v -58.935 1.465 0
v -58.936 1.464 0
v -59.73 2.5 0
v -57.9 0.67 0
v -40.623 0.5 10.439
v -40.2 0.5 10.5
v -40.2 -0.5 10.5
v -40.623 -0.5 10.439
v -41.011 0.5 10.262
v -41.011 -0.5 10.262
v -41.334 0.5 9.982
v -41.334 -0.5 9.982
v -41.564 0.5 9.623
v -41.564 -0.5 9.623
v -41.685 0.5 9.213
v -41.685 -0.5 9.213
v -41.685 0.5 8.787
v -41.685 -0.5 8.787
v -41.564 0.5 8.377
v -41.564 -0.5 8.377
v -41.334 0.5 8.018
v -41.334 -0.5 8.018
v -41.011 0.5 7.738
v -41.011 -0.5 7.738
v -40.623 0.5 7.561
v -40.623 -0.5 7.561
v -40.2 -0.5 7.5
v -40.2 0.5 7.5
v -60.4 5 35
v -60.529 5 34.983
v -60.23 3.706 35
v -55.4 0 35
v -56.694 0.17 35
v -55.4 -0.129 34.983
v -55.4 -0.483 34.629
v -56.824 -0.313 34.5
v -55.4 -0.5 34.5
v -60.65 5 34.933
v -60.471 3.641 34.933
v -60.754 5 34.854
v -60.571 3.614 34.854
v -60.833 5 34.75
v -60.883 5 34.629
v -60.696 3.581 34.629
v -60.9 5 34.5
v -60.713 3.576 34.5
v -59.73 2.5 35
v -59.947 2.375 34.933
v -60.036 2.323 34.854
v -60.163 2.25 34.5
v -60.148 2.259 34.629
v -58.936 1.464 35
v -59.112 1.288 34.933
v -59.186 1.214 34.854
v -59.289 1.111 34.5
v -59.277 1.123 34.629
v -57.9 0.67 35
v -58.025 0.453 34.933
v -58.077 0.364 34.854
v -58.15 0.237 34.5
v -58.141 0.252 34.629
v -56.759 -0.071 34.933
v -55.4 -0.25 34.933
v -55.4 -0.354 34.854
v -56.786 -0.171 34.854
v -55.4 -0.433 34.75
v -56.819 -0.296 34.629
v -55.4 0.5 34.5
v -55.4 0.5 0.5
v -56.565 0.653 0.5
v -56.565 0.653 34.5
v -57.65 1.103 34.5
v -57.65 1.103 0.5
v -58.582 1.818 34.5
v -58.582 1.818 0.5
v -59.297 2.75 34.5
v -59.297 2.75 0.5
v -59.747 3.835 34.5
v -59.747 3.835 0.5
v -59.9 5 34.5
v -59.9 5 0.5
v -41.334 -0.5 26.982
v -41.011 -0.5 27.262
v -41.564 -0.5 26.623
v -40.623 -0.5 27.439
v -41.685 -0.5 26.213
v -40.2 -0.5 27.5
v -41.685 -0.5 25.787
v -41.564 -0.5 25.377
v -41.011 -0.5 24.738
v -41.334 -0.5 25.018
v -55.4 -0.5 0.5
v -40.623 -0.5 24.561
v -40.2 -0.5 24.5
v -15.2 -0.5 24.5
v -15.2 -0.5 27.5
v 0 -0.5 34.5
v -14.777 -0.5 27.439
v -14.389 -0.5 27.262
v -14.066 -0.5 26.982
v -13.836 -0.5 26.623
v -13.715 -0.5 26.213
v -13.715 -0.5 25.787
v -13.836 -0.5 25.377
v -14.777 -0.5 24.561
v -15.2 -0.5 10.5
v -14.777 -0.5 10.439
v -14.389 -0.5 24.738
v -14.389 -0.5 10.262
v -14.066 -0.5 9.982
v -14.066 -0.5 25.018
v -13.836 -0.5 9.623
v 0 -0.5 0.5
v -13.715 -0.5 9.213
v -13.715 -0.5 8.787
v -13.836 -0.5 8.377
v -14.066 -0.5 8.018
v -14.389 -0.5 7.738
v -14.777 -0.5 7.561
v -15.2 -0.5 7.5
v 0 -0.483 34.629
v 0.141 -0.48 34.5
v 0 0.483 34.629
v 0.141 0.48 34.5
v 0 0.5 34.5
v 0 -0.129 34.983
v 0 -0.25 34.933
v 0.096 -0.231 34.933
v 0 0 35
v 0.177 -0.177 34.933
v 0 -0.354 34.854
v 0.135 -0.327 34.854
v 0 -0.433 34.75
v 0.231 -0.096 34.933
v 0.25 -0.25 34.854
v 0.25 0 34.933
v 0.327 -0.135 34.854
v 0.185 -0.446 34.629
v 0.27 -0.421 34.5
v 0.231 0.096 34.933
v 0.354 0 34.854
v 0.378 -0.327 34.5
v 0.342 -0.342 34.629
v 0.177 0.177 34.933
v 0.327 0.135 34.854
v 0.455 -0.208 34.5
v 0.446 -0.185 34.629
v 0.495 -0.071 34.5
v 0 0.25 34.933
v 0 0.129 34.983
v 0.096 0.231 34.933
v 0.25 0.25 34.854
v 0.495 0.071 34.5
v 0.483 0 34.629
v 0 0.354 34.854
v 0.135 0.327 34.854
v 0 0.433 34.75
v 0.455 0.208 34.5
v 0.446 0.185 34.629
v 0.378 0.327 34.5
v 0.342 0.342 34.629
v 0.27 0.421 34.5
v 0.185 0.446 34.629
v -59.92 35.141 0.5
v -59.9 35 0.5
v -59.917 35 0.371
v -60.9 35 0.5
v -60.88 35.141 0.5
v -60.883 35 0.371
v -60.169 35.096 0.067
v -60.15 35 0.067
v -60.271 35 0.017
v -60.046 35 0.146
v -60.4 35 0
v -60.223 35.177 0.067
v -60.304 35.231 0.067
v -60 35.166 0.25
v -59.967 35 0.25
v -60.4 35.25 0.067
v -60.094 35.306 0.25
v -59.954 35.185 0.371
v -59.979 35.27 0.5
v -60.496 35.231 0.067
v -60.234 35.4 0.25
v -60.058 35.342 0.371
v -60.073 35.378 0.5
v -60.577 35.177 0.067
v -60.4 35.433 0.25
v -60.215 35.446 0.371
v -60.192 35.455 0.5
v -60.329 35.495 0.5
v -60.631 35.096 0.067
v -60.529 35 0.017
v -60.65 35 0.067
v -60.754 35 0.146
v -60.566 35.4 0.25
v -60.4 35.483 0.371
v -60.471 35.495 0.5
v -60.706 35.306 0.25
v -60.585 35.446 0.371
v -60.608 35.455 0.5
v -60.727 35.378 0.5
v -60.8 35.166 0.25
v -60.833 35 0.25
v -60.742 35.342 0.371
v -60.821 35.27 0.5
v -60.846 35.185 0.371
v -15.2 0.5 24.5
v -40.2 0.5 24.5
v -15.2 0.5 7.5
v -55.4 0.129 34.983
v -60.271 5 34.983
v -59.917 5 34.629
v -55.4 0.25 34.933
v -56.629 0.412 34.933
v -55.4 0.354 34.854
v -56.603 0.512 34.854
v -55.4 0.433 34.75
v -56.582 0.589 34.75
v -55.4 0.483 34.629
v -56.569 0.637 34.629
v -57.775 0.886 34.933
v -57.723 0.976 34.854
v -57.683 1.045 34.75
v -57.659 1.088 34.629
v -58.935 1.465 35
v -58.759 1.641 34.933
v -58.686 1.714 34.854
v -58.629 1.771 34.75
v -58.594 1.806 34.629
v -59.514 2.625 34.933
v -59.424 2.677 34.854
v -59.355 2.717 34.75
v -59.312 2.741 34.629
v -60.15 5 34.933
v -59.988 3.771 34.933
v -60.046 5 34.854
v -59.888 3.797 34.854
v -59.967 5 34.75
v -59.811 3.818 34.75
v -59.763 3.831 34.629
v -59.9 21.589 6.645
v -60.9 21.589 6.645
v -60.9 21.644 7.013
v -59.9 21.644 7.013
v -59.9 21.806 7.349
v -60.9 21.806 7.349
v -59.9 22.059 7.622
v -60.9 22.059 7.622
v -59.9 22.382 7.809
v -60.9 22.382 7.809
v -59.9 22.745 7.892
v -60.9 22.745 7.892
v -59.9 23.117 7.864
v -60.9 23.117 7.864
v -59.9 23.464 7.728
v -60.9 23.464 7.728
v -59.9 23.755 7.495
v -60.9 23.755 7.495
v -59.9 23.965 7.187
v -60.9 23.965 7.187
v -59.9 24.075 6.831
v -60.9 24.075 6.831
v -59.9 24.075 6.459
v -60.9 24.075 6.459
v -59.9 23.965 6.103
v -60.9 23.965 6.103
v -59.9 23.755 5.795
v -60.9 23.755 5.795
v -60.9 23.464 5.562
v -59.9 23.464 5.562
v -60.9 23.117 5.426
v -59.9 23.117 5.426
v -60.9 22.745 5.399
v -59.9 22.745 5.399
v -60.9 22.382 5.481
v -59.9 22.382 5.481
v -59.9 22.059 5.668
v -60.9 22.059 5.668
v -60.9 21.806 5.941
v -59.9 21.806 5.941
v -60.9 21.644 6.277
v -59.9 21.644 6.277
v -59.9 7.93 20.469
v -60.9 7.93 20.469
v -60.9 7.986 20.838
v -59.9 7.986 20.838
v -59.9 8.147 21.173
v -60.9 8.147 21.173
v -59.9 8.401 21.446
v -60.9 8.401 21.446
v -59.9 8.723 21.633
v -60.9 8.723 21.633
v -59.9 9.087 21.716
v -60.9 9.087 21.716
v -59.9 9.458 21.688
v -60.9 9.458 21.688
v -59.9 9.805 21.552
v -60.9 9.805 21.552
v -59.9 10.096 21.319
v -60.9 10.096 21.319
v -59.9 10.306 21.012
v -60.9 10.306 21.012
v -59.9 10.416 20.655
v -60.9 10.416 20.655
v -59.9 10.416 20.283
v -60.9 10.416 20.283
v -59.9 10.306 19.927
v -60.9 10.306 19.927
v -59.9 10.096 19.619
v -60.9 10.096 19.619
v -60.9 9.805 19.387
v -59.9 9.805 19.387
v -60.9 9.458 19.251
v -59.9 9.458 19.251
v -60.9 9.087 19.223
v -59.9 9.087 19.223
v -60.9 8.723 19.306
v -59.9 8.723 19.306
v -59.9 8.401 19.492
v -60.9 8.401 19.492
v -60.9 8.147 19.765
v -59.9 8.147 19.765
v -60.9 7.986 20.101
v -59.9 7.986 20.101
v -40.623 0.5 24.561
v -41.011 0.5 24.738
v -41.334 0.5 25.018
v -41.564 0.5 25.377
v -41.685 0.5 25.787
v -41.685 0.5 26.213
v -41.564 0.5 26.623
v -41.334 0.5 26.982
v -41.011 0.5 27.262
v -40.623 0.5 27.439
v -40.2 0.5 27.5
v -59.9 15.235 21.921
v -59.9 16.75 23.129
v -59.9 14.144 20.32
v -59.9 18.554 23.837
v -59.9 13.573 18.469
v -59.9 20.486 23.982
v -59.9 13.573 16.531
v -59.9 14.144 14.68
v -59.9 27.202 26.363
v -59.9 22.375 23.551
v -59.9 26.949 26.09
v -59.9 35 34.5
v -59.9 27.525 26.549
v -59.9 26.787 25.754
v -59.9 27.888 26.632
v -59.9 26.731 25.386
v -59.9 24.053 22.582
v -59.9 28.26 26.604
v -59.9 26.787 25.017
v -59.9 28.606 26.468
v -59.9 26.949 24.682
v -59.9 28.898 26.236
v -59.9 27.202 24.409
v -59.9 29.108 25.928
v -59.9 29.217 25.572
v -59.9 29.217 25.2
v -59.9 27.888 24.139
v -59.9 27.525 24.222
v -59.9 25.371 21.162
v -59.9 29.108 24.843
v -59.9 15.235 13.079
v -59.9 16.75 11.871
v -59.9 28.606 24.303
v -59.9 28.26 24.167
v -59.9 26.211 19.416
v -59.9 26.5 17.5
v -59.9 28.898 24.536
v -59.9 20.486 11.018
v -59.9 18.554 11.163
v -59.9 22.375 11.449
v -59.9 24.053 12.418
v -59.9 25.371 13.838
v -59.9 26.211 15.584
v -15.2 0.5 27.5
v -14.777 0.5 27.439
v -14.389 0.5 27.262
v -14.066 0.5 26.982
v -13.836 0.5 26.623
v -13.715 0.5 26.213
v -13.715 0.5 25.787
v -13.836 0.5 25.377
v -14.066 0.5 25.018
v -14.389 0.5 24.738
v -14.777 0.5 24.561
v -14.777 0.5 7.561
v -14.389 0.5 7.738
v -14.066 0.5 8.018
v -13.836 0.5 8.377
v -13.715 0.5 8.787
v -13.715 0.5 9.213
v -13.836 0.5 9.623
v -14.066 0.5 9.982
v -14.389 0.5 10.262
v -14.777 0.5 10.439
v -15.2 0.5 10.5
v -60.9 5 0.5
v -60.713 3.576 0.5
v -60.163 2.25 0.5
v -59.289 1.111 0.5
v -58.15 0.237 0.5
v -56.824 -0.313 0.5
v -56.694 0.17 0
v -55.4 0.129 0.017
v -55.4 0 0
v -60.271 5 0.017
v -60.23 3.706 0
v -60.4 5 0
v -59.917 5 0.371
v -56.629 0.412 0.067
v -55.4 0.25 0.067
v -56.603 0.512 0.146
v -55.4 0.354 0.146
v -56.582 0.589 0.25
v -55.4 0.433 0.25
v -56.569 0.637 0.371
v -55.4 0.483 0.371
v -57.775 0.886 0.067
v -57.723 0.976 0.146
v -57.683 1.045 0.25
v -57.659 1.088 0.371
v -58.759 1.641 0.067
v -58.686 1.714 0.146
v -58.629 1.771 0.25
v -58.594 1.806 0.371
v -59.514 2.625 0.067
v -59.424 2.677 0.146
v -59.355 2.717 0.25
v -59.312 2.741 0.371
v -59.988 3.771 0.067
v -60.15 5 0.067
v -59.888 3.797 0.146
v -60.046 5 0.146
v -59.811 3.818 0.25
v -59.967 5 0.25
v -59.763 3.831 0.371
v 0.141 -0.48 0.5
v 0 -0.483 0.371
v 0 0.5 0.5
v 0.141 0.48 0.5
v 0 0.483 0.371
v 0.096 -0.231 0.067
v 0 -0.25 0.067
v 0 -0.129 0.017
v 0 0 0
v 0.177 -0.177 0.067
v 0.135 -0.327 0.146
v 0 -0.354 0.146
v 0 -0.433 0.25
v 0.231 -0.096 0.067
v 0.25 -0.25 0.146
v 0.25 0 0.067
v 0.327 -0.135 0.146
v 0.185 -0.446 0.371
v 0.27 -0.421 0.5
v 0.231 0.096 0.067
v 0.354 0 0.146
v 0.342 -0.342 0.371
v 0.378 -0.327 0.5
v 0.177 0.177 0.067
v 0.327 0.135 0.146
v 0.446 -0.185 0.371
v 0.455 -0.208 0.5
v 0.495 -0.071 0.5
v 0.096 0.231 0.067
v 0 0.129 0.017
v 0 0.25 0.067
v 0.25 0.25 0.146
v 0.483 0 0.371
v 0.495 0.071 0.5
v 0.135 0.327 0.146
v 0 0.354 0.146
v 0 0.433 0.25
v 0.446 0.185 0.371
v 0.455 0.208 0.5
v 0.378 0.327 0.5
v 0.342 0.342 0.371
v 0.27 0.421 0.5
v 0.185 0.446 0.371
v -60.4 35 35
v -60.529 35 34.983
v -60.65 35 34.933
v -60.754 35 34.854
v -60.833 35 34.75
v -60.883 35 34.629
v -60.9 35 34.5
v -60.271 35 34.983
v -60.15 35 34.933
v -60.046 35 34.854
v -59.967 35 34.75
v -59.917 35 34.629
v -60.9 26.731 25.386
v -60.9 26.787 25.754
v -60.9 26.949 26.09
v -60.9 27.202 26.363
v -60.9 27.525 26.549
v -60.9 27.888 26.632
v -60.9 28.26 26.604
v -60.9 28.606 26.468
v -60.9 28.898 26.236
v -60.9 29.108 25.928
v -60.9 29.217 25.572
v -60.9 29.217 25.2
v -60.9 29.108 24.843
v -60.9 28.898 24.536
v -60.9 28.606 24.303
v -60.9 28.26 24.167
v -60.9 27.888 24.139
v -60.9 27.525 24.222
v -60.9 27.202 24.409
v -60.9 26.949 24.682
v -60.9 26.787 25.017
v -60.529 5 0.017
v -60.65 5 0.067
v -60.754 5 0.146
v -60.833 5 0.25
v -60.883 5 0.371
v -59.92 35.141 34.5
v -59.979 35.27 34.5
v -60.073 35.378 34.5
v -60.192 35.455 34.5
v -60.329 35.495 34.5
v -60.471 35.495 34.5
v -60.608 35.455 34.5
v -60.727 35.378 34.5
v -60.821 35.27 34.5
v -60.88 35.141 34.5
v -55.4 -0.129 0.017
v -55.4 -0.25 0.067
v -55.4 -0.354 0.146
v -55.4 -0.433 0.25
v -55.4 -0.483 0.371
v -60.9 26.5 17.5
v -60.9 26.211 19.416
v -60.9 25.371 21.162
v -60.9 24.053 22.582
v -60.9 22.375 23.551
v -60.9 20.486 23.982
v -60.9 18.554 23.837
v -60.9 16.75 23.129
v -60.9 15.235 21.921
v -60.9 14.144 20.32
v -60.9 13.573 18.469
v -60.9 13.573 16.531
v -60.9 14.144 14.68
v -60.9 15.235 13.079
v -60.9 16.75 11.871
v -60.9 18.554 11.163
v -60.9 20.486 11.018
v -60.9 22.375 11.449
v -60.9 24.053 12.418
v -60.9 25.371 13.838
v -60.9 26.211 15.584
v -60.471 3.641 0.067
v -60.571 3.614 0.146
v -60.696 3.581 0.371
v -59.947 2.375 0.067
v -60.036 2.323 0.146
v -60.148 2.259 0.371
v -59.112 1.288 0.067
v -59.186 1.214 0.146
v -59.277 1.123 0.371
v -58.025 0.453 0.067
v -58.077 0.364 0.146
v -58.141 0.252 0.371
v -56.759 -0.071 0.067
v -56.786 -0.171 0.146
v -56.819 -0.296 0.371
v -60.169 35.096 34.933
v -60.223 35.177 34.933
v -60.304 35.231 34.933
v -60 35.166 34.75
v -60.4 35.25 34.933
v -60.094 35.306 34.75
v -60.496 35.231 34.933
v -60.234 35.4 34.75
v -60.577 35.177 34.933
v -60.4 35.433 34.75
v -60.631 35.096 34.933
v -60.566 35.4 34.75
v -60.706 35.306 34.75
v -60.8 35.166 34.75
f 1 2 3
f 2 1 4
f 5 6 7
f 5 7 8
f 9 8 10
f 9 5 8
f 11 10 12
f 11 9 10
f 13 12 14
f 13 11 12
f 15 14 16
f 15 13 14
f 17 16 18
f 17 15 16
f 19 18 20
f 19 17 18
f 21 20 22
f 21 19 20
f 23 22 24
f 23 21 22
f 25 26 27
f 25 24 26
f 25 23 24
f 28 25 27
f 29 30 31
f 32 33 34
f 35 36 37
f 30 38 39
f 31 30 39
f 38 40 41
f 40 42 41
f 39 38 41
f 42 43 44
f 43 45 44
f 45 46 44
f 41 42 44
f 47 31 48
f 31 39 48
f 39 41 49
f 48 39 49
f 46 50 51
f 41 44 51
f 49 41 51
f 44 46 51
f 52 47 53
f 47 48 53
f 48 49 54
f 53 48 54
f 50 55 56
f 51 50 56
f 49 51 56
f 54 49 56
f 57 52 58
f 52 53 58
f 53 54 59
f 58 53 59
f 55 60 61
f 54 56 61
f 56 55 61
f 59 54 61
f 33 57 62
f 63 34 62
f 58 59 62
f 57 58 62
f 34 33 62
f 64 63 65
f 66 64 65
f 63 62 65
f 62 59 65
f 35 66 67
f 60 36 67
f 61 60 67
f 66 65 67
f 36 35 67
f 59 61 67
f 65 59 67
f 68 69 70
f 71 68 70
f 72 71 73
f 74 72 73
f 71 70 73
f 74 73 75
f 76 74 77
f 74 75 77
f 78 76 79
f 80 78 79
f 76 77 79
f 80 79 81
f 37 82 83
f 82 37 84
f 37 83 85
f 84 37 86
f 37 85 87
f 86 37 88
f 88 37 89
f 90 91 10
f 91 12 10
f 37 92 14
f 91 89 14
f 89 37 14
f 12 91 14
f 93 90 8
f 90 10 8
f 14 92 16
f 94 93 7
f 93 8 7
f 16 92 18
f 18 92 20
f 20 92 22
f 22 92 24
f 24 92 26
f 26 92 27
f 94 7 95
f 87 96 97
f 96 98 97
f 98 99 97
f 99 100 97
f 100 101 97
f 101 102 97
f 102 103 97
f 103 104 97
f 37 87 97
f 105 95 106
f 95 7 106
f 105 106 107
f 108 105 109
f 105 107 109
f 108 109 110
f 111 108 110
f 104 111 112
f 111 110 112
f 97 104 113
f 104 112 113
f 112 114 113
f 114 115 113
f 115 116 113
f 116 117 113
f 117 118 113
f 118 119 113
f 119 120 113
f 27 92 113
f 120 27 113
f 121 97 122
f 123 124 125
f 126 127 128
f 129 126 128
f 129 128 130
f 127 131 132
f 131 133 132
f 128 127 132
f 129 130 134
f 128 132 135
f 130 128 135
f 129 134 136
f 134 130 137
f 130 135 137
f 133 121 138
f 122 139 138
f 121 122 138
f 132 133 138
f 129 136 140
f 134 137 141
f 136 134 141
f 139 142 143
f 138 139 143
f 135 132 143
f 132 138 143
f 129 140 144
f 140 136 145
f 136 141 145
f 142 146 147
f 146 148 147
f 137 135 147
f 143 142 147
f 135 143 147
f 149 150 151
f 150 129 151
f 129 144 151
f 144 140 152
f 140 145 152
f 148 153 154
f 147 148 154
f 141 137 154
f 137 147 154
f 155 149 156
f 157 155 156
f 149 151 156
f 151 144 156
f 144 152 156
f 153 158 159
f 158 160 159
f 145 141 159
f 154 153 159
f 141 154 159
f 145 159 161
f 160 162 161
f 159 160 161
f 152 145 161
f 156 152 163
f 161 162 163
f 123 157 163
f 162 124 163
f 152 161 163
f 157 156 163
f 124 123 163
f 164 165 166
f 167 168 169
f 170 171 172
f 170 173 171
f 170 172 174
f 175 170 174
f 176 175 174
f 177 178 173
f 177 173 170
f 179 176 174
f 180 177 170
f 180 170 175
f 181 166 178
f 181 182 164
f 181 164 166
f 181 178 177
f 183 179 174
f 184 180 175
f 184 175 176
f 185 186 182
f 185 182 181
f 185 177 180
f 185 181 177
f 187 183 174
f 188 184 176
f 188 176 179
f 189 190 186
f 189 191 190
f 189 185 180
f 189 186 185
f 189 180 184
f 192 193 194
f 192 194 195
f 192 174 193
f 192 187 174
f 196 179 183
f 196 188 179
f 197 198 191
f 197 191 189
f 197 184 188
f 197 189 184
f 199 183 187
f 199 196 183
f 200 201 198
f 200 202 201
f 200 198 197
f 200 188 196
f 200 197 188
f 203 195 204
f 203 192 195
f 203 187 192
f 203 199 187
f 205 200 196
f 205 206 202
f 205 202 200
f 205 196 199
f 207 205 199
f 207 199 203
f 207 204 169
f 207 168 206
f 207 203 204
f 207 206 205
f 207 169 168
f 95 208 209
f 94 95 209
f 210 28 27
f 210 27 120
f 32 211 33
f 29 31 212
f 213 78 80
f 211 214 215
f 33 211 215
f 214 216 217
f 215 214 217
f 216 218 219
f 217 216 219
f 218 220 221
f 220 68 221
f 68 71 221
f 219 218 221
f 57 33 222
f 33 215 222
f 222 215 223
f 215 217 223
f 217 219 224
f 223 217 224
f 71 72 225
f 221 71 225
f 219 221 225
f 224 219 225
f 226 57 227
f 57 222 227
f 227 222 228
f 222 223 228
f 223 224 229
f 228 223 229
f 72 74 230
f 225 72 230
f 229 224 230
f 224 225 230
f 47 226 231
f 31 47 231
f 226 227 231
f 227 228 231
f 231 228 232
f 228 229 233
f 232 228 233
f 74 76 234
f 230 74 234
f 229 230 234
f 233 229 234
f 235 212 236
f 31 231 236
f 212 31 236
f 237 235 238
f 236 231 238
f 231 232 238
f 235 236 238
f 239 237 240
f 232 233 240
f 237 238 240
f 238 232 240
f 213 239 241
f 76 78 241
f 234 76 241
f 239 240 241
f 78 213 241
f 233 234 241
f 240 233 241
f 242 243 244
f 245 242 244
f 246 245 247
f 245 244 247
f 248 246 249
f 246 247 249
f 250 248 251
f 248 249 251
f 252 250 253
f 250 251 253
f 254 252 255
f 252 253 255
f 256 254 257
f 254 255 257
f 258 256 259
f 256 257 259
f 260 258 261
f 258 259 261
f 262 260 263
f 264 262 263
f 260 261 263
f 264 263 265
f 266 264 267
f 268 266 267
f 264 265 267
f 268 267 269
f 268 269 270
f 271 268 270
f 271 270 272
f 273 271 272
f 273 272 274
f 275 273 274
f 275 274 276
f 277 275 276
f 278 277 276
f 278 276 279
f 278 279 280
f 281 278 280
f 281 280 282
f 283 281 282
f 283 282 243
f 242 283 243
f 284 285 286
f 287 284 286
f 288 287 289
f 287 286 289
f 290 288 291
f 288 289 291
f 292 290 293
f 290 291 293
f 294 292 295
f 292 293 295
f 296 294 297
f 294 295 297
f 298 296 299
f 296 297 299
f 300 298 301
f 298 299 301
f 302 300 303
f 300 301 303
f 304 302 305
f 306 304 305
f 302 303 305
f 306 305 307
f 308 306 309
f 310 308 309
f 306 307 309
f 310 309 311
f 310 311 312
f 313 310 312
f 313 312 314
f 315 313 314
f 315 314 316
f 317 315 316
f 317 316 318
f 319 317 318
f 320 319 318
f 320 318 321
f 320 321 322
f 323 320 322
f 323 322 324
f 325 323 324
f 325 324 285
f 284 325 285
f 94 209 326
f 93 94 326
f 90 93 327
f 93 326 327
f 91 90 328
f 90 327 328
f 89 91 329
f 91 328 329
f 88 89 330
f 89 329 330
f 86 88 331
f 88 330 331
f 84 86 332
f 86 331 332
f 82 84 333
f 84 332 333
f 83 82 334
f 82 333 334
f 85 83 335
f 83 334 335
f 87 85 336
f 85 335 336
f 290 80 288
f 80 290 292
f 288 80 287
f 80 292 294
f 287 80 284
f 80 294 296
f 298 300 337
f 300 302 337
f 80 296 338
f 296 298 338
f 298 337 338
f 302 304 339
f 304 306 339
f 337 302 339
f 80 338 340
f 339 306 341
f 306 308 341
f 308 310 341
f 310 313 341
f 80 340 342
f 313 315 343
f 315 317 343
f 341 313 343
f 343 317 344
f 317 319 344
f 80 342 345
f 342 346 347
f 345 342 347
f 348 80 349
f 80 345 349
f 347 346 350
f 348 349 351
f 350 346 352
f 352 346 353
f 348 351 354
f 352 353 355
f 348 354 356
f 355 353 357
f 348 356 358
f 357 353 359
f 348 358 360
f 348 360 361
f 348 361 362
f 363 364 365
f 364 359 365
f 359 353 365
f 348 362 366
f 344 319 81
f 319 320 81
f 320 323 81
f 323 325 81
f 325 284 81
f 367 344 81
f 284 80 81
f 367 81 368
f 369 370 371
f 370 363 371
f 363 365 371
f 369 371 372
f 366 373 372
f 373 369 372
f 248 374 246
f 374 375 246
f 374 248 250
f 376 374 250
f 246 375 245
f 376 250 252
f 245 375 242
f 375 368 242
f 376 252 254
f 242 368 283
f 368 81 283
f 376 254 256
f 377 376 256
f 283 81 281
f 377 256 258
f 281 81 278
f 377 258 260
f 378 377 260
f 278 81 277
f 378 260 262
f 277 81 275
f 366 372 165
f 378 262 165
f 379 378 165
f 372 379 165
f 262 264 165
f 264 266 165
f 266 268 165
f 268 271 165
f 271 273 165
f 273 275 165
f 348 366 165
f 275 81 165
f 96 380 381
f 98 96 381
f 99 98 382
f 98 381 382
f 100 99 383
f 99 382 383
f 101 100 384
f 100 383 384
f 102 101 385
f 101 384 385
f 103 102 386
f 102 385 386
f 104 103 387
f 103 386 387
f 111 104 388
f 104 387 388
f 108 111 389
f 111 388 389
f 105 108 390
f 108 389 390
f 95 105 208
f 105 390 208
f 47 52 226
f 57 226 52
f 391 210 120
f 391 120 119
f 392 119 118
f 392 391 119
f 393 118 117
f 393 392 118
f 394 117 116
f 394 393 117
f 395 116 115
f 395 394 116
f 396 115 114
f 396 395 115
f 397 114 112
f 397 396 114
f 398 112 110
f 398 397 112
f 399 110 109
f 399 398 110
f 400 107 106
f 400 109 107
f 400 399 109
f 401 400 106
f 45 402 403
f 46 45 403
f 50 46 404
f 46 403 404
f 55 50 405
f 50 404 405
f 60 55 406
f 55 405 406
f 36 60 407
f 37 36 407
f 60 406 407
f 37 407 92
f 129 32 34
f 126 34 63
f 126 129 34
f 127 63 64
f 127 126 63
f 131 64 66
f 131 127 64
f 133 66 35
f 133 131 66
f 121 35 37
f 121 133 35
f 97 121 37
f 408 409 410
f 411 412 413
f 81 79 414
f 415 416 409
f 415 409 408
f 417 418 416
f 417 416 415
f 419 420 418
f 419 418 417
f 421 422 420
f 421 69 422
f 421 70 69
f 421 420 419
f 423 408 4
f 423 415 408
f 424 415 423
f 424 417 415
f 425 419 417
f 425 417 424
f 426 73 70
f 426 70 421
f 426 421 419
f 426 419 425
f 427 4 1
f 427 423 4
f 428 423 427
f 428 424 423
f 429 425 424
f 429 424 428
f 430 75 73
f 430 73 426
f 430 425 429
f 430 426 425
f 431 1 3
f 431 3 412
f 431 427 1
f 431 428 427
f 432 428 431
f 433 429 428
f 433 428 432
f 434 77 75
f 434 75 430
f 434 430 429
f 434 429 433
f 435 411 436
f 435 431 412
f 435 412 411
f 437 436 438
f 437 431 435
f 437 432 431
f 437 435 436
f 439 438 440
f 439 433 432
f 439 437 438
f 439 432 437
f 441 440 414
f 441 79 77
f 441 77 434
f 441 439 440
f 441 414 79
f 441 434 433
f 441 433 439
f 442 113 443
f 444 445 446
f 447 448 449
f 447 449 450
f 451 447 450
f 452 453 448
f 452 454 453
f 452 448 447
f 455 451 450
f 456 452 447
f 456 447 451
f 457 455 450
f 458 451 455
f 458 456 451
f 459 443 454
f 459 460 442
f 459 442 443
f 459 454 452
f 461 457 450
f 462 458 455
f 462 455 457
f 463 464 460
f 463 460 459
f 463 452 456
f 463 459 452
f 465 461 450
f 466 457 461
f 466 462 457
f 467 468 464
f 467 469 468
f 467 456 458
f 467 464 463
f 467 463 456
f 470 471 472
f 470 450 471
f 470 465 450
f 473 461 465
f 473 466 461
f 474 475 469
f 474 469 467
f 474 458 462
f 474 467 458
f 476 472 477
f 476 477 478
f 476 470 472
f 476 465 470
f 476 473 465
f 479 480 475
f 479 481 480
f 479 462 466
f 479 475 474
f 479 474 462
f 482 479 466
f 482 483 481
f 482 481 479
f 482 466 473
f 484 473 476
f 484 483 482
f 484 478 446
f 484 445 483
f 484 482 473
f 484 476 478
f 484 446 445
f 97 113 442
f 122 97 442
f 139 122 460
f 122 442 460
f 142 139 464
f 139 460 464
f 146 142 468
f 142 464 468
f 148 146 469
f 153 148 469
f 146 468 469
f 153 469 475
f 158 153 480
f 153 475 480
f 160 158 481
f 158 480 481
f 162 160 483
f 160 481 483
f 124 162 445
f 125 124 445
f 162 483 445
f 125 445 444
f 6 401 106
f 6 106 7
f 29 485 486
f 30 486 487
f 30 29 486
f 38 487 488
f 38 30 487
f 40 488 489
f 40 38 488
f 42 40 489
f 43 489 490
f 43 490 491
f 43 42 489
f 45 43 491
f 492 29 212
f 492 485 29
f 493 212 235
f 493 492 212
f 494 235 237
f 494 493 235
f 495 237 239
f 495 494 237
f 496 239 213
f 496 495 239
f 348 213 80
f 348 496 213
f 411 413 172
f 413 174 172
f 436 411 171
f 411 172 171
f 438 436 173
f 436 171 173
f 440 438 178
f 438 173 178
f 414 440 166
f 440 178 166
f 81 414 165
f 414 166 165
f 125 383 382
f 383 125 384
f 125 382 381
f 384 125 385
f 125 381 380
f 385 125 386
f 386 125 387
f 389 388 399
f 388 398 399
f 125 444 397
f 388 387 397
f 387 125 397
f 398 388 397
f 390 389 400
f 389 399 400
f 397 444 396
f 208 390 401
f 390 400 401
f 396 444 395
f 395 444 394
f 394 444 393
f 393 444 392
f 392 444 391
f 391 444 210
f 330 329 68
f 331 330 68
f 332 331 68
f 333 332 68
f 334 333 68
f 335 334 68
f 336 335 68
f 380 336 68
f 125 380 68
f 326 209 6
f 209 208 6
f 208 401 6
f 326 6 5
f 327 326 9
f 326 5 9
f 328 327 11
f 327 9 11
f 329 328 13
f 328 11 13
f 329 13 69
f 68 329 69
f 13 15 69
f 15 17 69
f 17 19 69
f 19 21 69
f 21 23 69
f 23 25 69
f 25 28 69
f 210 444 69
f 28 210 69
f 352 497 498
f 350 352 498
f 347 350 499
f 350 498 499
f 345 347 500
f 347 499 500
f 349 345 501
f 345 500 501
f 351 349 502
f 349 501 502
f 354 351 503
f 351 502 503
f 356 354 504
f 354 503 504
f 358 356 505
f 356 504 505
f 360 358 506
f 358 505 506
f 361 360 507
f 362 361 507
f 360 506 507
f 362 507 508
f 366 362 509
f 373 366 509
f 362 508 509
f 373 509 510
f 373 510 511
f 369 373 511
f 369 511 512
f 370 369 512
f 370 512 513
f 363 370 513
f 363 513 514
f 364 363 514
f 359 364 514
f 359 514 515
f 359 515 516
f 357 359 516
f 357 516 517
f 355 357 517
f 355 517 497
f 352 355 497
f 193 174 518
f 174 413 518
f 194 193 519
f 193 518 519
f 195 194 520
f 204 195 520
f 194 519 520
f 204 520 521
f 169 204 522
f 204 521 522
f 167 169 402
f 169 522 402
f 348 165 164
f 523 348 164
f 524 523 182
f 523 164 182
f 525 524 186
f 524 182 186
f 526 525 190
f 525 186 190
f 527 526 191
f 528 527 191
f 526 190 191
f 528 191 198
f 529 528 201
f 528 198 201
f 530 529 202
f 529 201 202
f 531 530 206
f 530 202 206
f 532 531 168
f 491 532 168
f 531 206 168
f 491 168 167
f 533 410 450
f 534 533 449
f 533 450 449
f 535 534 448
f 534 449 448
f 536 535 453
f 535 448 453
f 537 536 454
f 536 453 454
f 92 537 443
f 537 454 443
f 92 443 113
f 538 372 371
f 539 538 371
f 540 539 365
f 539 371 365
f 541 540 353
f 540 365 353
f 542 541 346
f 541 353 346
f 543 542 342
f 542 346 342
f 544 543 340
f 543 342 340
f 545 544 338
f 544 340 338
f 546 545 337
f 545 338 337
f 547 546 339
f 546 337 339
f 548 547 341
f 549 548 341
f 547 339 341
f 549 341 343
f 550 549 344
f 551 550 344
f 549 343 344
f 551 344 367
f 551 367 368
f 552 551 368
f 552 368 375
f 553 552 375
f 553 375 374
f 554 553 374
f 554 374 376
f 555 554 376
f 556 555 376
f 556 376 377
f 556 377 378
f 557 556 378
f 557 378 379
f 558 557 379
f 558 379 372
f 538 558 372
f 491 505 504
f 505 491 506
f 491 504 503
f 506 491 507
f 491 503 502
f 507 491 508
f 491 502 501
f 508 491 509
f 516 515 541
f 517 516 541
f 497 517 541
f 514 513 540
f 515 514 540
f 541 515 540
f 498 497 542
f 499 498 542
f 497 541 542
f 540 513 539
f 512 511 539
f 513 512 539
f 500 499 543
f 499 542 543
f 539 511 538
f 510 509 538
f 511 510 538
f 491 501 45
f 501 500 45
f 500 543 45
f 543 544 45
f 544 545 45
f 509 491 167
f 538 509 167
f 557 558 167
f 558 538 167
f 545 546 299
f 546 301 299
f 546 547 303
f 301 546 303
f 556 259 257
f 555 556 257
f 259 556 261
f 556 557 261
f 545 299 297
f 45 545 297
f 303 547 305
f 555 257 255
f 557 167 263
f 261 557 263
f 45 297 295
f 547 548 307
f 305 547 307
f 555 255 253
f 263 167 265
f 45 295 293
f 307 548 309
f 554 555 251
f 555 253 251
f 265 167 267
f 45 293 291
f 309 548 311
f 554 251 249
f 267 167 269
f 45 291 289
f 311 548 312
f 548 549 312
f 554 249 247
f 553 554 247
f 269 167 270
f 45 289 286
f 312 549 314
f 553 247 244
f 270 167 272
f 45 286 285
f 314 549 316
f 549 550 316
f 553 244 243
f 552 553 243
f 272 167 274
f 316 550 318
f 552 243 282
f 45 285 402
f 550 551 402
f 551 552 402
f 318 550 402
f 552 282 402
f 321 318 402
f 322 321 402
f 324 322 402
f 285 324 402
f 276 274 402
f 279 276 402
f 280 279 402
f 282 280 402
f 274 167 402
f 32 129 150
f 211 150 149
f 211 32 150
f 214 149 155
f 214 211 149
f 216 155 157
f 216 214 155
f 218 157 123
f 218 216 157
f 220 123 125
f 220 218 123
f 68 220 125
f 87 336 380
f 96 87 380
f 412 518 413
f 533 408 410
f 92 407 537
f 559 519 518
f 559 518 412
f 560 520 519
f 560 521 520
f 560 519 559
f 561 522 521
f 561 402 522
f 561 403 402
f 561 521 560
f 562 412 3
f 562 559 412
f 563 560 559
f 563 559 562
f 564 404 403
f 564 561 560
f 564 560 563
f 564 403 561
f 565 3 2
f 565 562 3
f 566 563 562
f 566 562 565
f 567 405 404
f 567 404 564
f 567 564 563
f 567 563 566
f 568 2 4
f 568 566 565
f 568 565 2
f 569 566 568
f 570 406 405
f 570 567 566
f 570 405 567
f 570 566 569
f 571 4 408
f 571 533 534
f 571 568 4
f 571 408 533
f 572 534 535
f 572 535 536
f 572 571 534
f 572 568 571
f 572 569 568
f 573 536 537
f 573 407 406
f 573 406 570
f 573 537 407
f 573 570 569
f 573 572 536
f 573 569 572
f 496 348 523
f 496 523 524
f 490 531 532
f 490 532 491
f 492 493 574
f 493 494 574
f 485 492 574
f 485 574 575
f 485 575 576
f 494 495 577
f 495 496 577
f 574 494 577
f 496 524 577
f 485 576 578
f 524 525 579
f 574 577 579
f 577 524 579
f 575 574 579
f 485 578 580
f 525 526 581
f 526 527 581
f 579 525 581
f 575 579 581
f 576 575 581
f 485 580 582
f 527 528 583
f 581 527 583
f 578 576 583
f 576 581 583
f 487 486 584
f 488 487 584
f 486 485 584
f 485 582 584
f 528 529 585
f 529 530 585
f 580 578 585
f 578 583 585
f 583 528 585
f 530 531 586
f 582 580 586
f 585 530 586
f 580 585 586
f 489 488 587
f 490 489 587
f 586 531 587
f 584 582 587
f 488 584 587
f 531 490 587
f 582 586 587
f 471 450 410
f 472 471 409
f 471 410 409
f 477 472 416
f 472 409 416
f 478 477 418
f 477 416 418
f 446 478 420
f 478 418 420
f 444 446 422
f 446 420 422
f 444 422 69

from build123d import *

# Parameters (mm, degrees)
BOSS_EXTRUDE1_DEPTH   = 35
CUT_EXTRUDE1_REACH    = 80.316
SKETCH3_R             = 6.5
FILLET1_R             = 0.5
CUT_EXTRUDE3_DEPTH    = 35
F_2_5MM_DOWEL_HOLE1_D = 2.5


with BuildPart() as part:
    # Sketch1 → Boss-Extrude1 (new body)
    with BuildSketch(Plane.XY):
        with BuildLine():
            Line((0, 0.5), (-55.4, 0.5))
            ThreePointArc((-55.4, 0.5), (-58.581980515, 1.818019485), (-59.9, 5))
            Line((-59.9, 5), (-59.9, 35))
            ThreePointArc((-59.9, 35), (-60.4, 35.5), (-60.9, 35))
            Line((-60.9, 35), (-60.9, 5))
            ThreePointArc((-60.9, 5), (-59.289087297, 1.110912703), (-55.4, -0.5))
            Line((-55.4, -0.5), (0, -0.5))
            ThreePointArc((0, -0.5), (0.5, 0), (0, 0.5))
        make_face()
    extrude(amount=BOSS_EXTRUDE1_DEPTH)

    # Sketch3 → Cut-Extrude1 (cut, up to next)
    with BuildSketch(Plane(origin=(-59.9, 0, 0), x_dir=(0, 0, -1), z_dir=(1, 0, 0)), mode=Mode.PRIVATE) as cut_extrude1_sk1:
        with Locations(Location((-17.5, 20, 0), (0, 0, 90))):
            Circle(SKETCH3_R)
    cut_extrude1_tool1 = extrude(cut_extrude1_sk1.sketch, amount=-CUT_EXTRUDE1_REACH, mode=Mode.PRIVATE) & part.part
    add(cut_extrude1_tool1.solids().sort_by_distance((-59.9, 20, 17.5))[0], mode=Mode.SUBTRACT)

    # Fillet1
    fillet1_edges = [part.edges().sort_by_distance(p)[0] for p in [
        (-60.9, 20, 0),
        (-60.4, 35.5, 0),
        (-59.9, 20, 0),
        (-58.581980515, 1.818019485, 0),
        (-60.4, 35.5, 35),
        (-60.9, 20, 35),
        (-59.289087297, 1.110912703, 35),
        (-27.7, -0.5, 35),
        (0.5, 0, 35),
        (-27.7, 0.5, 35),
        (-58.581980515, 1.818019485, 35),
        (-27.7, 0.5, 0),
        (-59.9, 20, 35),
        (0.5, 0, 0),
        (-27.7, -0.5, 0),
        (-59.289087297, 1.110912703, 0),
    ]]
    fillet(fillet1_edges, radius=FILLET1_R - 0.0001)  # a hair under: the kernel refuses the full size

    # Sketch6 → Cut-Extrude3 (cut)
    with BuildSketch(Plane(origin=(0, 0.5, 0), x_dir=(1, 0, 0), z_dir=(0, 1, 0))):
        with BuildLine():
            Line((-40.2, -7.5), (-15.2, -7.5))
            ThreePointArc((-15.2, -7.5), (-13.7, -9), (-15.2, -10.5))
            Line((-15.2, -10.5), (-40.2, -10.5))
            ThreePointArc((-40.2, -10.5), (-41.7, -9), (-40.2, -7.5))
        make_face()
        with BuildLine():
            Line((-40.2, -27.5), (-15.2, -27.5))
            ThreePointArc((-15.2, -27.5), (-13.7, -26), (-15.2, -24.5))
            Line((-15.2, -24.5), (-40.2, -24.5))
            ThreePointArc((-40.2, -24.5), (-41.7, -26), (-40.2, -27.5))
        make_face()
    extrude(amount=-CUT_EXTRUDE3_DEPTH, mode=Mode.SUBTRACT)

    # Ø2.5mm Dowel Hole1 (through all)
    with Locations(Plane(origin=(-59.9, 27.981374836, 25.385813574), x_dir=(0, 1, 0), z_dir=(1, 0, 0))):
        with Locations((0, 0), (-18.801377139, -4.916646995), (-5.14274737, -18.740793726)):
            Hole(F_2_5MM_DOWEL_HOLE1_D / 2)


solid = part.part
